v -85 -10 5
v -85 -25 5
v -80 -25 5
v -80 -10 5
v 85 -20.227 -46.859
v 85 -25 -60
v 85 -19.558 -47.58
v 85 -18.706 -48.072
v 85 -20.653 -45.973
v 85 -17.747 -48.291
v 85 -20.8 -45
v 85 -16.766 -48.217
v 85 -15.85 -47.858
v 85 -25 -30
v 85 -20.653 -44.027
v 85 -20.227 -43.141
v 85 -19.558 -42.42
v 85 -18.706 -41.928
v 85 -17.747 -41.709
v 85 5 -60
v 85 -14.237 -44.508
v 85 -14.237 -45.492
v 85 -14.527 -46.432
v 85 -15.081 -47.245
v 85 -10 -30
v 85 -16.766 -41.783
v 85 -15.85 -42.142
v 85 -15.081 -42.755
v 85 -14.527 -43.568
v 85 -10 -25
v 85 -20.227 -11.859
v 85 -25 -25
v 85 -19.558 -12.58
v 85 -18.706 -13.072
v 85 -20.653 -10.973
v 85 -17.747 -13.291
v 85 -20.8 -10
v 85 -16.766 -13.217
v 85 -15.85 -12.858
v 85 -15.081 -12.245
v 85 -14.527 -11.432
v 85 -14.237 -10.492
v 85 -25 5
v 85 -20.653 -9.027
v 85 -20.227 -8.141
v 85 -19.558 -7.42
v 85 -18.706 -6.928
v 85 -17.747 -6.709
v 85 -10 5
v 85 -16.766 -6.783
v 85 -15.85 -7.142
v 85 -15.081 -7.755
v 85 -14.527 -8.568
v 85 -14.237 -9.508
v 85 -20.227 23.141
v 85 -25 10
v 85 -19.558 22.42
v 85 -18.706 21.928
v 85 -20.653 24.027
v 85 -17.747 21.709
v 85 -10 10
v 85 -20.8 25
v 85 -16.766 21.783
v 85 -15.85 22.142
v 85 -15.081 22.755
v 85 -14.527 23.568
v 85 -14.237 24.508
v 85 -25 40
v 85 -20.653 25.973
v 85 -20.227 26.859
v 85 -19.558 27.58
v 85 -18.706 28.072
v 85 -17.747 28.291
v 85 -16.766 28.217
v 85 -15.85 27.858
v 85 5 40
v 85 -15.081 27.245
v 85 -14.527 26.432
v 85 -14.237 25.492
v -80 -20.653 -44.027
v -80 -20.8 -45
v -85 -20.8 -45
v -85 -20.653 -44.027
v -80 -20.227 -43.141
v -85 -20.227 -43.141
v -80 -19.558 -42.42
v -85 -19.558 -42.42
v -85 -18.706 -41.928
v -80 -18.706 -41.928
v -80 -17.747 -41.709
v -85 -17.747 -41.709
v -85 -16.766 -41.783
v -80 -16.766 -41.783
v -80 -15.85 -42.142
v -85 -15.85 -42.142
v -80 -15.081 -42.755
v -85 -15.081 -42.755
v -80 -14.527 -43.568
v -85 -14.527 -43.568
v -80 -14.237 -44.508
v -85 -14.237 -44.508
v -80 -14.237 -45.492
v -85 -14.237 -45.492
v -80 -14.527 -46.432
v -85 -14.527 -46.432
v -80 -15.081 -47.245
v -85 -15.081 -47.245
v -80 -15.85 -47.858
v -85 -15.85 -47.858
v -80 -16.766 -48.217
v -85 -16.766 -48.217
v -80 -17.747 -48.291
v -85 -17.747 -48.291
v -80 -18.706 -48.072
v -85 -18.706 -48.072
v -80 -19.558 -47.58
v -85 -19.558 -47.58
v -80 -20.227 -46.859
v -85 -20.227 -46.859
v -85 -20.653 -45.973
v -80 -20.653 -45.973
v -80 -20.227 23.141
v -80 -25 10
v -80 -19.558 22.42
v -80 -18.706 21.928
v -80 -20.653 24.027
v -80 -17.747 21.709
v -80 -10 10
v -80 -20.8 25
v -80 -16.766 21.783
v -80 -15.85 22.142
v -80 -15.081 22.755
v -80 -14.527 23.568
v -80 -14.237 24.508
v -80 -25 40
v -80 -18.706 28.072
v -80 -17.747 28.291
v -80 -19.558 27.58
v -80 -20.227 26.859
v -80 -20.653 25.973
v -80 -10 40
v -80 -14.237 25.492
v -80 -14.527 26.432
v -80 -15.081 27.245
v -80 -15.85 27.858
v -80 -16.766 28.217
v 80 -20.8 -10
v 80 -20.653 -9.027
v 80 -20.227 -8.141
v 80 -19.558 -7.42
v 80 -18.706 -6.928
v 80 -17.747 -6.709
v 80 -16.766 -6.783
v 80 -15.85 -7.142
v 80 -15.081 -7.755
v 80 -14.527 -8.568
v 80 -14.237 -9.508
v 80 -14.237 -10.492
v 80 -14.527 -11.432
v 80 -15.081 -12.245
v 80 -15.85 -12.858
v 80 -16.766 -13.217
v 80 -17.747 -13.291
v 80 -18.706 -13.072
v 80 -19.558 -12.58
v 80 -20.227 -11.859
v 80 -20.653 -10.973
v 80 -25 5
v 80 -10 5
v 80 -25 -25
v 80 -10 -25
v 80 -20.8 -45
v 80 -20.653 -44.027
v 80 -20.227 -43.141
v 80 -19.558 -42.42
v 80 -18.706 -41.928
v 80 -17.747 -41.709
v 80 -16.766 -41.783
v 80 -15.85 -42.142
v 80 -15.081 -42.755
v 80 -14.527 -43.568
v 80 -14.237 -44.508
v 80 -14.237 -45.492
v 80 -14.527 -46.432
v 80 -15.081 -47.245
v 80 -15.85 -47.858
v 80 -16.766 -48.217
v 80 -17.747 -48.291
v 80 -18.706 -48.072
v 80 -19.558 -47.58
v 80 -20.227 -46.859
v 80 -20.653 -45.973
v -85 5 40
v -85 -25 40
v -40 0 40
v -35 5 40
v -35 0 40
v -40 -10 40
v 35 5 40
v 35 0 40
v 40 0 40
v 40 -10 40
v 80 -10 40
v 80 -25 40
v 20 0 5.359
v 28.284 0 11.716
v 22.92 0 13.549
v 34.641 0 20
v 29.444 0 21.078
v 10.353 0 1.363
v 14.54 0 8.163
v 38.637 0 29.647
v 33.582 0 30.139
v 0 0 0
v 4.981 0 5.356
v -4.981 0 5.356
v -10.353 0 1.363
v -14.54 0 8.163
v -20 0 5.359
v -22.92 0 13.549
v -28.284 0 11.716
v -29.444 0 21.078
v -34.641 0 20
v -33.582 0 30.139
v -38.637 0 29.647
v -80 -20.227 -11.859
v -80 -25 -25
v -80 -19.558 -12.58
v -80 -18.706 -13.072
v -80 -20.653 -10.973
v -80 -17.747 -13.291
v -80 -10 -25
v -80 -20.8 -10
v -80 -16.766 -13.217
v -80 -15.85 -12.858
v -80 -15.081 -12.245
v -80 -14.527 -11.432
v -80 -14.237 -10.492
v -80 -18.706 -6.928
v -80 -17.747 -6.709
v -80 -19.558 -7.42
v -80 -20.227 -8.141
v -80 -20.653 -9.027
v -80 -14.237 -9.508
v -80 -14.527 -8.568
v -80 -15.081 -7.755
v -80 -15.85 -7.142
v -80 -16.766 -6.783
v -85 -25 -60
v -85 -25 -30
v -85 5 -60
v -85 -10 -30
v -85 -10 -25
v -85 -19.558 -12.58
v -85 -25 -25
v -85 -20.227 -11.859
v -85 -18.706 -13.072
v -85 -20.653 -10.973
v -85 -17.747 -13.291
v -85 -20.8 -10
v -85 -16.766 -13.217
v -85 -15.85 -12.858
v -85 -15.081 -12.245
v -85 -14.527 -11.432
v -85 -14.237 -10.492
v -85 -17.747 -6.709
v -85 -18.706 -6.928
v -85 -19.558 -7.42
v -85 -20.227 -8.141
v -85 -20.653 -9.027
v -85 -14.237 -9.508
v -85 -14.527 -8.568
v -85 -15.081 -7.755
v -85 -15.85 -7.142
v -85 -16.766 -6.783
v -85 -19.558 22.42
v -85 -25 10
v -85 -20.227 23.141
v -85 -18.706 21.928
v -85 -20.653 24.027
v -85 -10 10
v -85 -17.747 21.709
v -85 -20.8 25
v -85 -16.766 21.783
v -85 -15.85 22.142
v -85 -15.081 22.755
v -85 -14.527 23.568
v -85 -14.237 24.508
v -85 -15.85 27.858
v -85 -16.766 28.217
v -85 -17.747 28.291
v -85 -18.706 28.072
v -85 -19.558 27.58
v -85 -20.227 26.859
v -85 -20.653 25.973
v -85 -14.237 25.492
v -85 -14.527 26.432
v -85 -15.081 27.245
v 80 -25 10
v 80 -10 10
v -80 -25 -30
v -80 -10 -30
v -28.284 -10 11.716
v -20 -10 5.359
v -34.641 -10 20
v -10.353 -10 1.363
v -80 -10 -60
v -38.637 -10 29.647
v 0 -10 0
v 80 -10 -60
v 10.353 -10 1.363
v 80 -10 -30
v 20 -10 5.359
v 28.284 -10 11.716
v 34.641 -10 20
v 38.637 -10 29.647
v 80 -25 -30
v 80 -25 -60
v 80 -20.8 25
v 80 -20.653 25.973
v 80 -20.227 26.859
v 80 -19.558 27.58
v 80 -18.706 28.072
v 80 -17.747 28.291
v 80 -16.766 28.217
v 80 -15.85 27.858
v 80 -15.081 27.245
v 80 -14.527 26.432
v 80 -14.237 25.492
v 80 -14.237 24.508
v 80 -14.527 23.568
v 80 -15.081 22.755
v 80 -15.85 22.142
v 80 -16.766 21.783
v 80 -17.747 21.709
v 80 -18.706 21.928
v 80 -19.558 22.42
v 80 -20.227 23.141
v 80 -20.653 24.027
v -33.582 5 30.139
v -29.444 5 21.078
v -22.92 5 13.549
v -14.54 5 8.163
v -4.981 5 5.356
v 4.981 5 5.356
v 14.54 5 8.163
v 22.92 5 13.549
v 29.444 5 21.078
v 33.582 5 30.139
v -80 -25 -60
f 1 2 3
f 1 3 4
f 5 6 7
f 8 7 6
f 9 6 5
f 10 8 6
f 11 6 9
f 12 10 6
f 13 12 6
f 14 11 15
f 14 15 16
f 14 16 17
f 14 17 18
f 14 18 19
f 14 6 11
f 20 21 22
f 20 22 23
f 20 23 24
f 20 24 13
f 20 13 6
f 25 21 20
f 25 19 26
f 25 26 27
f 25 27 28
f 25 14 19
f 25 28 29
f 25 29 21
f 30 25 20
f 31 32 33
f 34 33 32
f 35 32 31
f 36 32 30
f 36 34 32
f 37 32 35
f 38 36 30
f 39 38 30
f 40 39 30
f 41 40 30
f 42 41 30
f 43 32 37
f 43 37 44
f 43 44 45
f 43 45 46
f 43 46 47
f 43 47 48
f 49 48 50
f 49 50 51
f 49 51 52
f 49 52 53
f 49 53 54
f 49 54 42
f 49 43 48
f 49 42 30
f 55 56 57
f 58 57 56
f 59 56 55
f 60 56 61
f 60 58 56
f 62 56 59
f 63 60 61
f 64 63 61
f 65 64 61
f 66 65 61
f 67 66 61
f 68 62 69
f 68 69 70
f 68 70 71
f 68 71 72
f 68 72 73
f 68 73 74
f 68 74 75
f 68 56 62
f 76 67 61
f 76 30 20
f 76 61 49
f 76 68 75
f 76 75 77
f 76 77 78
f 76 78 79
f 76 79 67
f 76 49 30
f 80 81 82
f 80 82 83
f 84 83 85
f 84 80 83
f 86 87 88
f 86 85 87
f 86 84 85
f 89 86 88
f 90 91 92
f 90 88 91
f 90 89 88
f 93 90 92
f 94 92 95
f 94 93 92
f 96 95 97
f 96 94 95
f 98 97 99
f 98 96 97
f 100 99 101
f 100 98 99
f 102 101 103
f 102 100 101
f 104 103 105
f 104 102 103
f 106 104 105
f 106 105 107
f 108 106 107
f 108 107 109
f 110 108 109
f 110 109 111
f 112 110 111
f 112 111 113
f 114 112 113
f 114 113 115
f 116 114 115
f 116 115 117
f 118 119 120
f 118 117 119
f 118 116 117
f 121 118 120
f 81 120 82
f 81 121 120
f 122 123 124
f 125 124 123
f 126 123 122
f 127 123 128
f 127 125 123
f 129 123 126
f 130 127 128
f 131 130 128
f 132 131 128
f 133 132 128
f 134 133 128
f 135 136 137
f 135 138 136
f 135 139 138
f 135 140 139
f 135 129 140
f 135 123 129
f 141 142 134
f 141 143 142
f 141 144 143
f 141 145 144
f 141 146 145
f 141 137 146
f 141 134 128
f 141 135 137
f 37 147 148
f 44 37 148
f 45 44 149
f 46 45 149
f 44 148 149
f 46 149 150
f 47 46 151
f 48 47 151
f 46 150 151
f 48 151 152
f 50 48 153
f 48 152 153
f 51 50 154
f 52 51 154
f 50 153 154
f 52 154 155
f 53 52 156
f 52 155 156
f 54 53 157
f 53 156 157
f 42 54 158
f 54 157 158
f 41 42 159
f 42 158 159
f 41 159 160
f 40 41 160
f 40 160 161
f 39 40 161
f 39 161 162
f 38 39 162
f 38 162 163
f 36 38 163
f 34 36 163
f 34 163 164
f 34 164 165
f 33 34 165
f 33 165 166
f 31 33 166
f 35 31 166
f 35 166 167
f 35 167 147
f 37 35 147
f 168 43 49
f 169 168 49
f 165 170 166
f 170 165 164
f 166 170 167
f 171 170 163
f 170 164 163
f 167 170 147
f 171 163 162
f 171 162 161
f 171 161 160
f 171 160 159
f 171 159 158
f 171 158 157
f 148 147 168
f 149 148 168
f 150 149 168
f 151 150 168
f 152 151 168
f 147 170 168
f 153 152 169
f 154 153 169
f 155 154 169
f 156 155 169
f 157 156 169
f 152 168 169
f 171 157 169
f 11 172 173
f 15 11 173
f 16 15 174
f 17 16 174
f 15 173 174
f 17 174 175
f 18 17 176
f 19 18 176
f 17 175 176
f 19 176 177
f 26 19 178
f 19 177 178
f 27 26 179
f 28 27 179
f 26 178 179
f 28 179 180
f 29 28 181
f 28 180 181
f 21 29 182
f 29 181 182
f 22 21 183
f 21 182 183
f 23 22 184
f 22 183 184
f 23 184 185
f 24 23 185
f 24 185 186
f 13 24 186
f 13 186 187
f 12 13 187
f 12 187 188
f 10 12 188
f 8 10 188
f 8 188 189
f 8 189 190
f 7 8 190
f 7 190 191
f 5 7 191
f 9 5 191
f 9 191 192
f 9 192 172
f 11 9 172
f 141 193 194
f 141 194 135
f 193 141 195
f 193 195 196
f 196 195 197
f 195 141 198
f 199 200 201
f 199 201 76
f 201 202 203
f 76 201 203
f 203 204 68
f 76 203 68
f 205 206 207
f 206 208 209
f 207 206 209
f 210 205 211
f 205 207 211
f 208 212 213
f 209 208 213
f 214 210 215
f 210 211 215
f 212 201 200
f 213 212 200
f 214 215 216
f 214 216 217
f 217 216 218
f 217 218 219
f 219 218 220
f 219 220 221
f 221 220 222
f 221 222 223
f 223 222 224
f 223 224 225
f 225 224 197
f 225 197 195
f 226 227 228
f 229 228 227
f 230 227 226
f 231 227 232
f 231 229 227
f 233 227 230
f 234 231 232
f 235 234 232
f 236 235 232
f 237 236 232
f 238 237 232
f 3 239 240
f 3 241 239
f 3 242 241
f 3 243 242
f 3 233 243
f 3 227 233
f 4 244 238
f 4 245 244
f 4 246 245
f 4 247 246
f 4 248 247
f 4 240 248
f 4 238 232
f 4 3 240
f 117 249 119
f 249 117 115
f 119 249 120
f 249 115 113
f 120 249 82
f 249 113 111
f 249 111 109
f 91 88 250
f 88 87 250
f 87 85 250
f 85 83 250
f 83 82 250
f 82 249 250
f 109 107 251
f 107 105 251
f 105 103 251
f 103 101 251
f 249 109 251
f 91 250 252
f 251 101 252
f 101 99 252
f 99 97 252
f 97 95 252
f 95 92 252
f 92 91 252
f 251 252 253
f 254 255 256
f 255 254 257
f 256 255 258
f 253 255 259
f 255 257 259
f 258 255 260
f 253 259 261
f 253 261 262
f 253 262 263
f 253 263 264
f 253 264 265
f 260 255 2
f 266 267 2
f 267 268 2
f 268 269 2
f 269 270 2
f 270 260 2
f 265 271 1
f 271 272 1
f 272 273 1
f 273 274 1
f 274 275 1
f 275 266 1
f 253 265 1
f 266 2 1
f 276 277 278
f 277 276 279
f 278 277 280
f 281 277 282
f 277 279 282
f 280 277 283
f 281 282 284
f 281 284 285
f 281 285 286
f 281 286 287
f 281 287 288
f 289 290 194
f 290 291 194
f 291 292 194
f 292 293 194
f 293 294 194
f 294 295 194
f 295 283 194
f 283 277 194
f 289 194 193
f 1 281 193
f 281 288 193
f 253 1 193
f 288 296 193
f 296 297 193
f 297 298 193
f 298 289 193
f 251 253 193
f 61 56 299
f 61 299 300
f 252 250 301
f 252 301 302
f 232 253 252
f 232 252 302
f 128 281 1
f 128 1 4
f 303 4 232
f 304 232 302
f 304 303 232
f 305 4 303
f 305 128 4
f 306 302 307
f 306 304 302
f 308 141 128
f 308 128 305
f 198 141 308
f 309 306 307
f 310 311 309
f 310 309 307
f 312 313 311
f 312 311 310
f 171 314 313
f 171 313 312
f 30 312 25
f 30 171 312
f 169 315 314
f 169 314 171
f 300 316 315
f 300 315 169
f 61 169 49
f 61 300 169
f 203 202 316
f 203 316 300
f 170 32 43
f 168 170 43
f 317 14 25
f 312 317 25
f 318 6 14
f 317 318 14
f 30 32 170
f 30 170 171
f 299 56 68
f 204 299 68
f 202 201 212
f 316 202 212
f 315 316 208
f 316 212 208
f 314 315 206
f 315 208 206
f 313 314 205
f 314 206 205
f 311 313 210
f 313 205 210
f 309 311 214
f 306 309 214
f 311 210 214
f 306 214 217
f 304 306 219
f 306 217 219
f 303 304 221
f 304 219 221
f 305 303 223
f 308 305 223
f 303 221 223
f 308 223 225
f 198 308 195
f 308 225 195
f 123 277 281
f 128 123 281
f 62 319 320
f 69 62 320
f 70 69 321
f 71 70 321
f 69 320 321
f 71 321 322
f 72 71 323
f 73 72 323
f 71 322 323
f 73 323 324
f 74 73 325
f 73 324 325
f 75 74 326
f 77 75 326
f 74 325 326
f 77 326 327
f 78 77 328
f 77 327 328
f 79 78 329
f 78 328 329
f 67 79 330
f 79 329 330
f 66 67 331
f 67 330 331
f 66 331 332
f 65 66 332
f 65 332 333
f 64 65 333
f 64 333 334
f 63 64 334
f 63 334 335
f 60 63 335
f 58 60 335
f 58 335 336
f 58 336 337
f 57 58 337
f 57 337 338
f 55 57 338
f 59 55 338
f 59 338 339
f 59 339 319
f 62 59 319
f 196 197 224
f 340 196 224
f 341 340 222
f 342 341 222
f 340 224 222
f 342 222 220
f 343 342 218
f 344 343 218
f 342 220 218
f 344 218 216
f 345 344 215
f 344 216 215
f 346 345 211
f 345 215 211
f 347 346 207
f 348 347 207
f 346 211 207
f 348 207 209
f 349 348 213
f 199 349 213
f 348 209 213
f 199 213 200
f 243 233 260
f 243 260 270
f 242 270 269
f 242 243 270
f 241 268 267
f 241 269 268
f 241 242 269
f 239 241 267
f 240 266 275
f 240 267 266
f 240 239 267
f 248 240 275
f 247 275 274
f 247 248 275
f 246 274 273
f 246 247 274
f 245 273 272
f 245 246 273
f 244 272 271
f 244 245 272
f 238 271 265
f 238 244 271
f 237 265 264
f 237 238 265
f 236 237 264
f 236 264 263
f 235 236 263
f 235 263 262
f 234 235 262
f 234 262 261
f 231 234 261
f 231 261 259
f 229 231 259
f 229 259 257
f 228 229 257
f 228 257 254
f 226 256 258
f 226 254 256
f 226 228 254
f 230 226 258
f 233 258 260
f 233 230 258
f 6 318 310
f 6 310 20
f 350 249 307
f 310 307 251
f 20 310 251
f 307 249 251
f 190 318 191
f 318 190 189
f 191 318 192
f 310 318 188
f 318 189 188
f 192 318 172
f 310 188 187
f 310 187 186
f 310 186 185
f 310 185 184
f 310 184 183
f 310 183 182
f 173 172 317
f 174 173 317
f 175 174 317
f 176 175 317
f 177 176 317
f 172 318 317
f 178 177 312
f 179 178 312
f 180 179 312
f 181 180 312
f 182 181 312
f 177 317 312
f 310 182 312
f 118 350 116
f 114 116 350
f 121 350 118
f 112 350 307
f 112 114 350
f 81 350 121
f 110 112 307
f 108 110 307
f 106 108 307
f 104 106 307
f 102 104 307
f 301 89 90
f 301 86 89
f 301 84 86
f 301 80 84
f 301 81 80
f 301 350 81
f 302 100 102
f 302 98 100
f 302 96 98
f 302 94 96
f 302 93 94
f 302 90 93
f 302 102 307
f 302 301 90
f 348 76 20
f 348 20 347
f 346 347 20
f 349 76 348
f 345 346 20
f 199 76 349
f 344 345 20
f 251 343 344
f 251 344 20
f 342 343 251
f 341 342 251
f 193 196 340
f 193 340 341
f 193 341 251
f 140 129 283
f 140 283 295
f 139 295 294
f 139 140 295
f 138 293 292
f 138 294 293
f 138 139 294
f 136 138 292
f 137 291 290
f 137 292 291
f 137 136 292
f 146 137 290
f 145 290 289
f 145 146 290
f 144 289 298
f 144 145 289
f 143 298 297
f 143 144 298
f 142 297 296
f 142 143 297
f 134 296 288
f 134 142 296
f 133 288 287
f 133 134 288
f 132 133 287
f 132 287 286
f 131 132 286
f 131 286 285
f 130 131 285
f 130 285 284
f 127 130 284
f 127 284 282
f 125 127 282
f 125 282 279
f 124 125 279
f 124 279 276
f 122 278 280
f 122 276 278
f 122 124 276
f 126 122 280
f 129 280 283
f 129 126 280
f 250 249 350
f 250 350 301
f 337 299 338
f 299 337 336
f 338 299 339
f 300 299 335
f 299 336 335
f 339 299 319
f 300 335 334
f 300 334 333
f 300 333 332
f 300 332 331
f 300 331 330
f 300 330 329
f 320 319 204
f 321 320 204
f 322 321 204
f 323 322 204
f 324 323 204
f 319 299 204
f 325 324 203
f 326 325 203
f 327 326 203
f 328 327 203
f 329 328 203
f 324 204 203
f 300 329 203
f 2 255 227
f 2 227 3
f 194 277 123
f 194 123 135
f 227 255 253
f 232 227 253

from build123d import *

# Parameters (mm, degrees)
F1_DEPTH = 10
F3_DEPTH = 5
F4_W     = 15
F4_H     = 30
F5_DEPTH = 5
F6_D     = 6.6
F6_DEPTH = 14.25
F6_TIP   = 1.9828400428


# Not quite as in the source:
# - a pattern or mirror of a feature is missing from the dataset's text; its kind, count and spacing are read off the source's solid


with BuildPart() as f1:
    # F0 (on Front) → F1 (new body)
    with BuildSketch(Plane.XZ):
        with BuildLine():
            ThreePointArc((40, 40), (0, 0), (-40, 40))
            Line((-40, 40), (-85, 40))
            Line((-85, 40), (-85, -60))
            Line((-85, -60), (85, -60))
            Line((85, -60), (85, 40))
            Line((85, 40), (40, 40))
        make_face()
    extrude(amount=F1_DEPTH)

    # F2 (on face) → F3 (join)
    with BuildSketch(Plane(origin=(0, 0, 0), x_dir=(-1, 0, 0), z_dir=(0, 1, 0))):
        with BuildLine():
            ThreePointArc((40, 40), (0, 0), (-40, 40))
            Line((-40, 40), (-85, 40))
            Line((-85, 40), (-85, -60))
            Line((-85, -60), (85, -60))
            Line((85, -60), (85, 40))
            Line((85, 40), (40, 40))
        make_face()
        with BuildLine():
            ThreePointArc((35, 40), (0, 5), (-35, 40))
            Line((-35, 40), (-40, 40))
            ThreePointArc((-40, 40), (0, 0), (40, 40))
            Line((40, 40), (35, 40))
        make_face()
    extrude(amount=F3_DEPTH)

    # F4 (on face) → F5 (join)
    with BuildSketch(Plane.YZ.offset(85)):
        with Locations((-17.5, -45)):
            Rectangle(F4_W, F4_H)
        with Locations((-17.5, -10)):
            Rectangle(F4_W, F4_H)
        with Locations((-17.5, 25)):
            Rectangle(F4_W, F4_H)
    f5 = extrude(amount=-F5_DEPTH)

    # F5_copies: F5 across plane
    add(f5.mirror(Plane(origin=(0, 0, 0), x_dir=(0, 0, -1), z_dir=(-1, 0, 0))))

    # F6
    with Locations(Plane.YZ.offset(85)):
        with Locations((-17.5, 25), (-17.5, -10), (-17.5, -45)):
            f6 = Hole(F6_D / 2, depth=F6_DEPTH)
            with Locations((0, 0, -(F6_DEPTH + F6_TIP / 2))):  # 118° drill point
                Cone(0, F6_D / 2, F6_TIP, mode=Mode.SUBTRACT)

    # F6_copies: F6 across plane
    add(f6.mirror(Plane(origin=(0, 0, 0), x_dir=(0, 0, -1), z_dir=(-1, 0, 0))), mode=Mode.SUBTRACT)


solid = f1.part
